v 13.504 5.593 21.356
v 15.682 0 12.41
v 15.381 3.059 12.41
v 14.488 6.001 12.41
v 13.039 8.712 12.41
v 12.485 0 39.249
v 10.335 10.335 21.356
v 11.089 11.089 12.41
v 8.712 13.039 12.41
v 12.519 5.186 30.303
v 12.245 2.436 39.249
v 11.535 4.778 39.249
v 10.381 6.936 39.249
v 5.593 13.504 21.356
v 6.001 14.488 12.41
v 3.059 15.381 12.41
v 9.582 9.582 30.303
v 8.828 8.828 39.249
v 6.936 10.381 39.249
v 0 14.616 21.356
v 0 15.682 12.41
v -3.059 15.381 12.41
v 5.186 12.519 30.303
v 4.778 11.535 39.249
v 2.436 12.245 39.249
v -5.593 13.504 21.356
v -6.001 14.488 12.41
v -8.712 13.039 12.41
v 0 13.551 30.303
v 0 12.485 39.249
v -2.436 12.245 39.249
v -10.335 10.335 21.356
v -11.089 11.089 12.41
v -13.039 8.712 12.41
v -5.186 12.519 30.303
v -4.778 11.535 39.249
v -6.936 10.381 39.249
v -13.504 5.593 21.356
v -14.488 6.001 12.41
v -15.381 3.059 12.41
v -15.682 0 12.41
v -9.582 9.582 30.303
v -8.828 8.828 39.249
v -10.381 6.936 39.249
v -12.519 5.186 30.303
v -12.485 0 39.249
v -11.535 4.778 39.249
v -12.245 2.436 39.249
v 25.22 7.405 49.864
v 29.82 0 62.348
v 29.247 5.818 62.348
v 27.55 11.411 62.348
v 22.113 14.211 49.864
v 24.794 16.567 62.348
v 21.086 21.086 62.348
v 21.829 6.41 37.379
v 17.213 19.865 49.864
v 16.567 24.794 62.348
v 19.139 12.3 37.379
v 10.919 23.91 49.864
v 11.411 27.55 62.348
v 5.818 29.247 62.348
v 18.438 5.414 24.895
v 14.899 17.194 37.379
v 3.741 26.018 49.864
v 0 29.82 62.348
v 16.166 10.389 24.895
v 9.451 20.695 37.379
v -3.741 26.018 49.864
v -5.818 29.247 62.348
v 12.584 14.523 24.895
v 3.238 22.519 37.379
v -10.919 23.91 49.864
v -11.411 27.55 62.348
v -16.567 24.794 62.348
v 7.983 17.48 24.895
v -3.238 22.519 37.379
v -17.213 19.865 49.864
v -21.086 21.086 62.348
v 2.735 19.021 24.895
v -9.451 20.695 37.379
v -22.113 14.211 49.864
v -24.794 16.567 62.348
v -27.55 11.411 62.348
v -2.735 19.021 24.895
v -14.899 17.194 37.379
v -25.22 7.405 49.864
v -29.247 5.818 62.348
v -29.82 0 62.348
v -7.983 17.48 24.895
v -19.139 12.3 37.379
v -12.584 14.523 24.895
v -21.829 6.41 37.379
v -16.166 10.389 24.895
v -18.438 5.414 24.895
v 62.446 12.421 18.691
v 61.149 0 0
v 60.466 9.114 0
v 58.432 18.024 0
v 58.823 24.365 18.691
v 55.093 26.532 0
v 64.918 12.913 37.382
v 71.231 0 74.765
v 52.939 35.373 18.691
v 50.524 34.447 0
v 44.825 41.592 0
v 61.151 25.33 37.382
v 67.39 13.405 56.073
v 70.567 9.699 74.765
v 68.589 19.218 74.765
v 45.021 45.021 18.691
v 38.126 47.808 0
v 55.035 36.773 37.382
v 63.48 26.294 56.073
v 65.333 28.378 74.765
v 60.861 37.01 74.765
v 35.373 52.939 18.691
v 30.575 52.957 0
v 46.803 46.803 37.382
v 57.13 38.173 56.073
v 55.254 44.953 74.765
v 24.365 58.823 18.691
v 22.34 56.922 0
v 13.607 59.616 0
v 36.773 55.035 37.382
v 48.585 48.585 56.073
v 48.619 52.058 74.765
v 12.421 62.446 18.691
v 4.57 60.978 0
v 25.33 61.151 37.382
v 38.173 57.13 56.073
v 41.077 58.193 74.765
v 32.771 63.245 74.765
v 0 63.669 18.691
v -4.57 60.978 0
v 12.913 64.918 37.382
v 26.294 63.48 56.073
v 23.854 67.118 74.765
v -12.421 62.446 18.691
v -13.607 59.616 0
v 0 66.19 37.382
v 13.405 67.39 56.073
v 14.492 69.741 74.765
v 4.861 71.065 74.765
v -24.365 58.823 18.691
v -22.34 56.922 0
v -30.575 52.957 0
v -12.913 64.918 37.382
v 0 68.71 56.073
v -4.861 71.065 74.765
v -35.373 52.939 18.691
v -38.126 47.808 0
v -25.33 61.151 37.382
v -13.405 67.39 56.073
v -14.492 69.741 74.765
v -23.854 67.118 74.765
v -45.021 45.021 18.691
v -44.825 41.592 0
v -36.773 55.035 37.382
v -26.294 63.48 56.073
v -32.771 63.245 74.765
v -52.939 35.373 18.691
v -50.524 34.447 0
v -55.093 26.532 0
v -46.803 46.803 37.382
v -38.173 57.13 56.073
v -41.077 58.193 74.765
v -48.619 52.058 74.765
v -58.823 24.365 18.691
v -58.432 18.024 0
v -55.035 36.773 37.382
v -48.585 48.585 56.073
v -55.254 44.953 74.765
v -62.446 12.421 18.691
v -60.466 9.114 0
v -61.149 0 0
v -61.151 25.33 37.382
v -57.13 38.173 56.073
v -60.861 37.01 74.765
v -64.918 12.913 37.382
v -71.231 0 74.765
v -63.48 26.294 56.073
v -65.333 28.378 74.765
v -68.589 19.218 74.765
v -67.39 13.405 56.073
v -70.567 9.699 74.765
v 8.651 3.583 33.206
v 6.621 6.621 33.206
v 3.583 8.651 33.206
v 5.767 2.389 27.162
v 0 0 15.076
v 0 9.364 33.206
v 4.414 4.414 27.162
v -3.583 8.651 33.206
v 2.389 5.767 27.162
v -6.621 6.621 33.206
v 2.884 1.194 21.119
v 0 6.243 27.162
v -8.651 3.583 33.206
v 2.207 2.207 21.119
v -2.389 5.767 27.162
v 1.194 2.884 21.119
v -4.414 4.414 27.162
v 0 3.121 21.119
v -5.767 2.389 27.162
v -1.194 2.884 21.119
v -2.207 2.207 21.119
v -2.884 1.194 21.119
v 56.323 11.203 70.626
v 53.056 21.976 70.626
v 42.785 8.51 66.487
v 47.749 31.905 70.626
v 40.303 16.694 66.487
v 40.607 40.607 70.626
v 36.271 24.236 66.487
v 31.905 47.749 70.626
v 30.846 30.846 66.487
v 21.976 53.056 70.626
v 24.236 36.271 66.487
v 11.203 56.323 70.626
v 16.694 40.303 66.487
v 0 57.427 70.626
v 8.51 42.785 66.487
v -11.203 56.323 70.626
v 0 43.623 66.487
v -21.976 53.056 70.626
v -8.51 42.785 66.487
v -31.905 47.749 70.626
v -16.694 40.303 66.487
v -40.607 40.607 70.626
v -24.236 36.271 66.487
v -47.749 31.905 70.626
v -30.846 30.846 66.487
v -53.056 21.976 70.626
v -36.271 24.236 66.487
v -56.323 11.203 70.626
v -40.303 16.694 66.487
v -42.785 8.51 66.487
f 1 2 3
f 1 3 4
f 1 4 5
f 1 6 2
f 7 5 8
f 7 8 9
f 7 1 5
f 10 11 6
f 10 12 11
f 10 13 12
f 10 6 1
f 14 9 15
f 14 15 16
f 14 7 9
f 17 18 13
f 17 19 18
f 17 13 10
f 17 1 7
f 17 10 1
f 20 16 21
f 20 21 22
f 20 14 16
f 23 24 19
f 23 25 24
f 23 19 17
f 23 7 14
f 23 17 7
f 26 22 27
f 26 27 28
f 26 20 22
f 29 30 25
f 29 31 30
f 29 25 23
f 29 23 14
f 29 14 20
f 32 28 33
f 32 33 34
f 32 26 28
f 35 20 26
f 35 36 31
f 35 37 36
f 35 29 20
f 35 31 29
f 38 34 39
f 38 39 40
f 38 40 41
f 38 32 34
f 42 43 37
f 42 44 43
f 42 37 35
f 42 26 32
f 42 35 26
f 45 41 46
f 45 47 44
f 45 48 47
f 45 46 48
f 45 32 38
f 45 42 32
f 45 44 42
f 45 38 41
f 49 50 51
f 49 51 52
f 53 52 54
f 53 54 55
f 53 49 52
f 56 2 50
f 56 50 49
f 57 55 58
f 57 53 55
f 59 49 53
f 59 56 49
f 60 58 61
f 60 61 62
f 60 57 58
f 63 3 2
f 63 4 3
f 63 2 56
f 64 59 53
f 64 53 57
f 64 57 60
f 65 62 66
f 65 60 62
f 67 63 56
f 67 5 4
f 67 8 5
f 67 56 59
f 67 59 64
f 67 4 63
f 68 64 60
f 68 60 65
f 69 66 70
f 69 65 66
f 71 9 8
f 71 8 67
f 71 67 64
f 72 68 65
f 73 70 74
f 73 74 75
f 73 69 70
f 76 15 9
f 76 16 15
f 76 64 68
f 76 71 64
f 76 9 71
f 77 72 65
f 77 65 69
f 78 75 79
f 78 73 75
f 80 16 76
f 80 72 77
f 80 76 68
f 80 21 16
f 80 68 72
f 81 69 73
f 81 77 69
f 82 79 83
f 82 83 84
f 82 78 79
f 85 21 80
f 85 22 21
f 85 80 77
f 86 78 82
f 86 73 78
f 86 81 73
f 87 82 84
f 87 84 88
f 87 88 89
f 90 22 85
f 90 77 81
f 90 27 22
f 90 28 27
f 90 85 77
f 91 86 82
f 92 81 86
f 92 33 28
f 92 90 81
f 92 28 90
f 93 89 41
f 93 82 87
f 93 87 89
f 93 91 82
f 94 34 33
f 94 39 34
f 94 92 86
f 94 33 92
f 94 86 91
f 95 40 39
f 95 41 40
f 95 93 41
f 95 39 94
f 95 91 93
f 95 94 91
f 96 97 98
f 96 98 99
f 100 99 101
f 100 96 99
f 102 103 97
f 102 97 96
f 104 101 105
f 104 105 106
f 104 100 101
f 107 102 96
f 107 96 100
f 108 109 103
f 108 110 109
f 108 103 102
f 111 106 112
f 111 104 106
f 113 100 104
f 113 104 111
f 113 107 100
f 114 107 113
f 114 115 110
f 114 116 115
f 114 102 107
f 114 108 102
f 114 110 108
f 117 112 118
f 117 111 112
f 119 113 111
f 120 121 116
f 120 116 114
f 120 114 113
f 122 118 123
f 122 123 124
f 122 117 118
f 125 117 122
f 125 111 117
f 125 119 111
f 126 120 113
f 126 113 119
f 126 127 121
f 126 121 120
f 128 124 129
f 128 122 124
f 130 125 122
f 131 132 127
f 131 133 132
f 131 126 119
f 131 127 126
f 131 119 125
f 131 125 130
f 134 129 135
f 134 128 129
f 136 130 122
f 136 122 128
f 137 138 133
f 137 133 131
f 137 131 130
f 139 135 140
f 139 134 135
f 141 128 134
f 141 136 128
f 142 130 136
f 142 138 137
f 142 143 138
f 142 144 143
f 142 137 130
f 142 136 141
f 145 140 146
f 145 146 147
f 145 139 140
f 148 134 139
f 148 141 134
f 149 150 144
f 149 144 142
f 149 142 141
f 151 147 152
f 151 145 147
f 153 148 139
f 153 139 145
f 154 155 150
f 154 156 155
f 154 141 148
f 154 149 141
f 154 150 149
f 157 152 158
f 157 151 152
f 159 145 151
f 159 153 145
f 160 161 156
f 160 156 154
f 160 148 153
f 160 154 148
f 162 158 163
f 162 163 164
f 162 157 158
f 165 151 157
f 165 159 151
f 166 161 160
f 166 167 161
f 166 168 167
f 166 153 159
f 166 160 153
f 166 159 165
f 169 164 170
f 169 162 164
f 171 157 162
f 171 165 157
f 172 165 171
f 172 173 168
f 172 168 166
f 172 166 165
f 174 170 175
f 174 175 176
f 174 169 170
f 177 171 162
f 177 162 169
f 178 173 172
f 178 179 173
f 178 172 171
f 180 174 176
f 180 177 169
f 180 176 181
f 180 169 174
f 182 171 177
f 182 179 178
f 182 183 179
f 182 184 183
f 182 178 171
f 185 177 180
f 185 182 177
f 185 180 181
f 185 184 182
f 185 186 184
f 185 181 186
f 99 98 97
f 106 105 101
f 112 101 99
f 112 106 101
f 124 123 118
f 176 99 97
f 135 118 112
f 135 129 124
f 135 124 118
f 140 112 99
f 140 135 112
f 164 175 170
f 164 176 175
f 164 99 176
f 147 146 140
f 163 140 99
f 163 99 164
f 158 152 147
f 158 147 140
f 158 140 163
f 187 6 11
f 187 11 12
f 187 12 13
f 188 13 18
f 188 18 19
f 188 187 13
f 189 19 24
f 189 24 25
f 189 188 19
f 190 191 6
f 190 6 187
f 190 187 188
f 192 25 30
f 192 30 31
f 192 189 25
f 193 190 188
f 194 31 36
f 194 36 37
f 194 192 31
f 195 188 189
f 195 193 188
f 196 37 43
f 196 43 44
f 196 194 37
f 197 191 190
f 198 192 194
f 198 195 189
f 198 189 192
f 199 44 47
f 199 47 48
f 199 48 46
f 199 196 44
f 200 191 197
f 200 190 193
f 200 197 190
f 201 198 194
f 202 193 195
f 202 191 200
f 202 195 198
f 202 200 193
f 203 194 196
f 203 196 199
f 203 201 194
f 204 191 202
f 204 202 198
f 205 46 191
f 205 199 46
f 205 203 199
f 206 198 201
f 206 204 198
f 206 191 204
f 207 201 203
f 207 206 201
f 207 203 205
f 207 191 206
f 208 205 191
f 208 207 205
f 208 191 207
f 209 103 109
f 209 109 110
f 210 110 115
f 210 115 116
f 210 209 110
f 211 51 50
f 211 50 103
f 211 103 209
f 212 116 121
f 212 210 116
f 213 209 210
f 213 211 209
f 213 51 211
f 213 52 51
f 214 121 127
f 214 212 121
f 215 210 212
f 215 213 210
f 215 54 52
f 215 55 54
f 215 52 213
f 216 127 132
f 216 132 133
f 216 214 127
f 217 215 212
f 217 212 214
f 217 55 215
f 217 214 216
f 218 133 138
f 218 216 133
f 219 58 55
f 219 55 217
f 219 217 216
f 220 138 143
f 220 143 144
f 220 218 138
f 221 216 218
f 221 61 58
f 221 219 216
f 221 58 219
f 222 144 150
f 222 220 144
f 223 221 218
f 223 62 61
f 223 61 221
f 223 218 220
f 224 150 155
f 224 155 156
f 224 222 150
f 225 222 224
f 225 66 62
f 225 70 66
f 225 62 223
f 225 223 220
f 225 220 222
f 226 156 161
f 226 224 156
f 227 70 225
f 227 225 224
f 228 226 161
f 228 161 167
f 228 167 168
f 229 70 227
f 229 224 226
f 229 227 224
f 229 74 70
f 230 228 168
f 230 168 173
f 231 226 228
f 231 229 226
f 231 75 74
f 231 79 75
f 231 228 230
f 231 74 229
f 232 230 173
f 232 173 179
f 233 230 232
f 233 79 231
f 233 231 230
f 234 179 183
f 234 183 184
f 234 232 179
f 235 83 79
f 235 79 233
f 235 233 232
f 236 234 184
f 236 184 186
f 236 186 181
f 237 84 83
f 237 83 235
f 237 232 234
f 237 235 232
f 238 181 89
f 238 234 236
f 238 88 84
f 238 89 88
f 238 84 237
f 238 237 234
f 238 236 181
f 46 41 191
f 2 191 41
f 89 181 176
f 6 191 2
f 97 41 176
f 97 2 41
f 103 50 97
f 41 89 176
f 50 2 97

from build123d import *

# Parameters (mm, degrees)
F1_ANGLE = 180


# Not quite as in the source:
# - the program builds the solid bodies; features that only make, move or delete a surface that nothing else refers to are left out


with BuildPart() as f1:
    # F0 (on Front) → F1 (revolve)
    with BuildSketch(Plane.XZ):
        Polygon((12.4851092696, 39.2489619553), (0, 15.0755345821), (0, 0), (61.1490756273, 0), (71.2305568159, 74.7646316886), (29.8195946962, 62.3483546078), (15.6820116428, 12.4102499136), align=None)
    revolve(axis=Axis((0, 0, 7.5377672911), (0, 0, 1)), revolution_arc=F1_ANGLE)


solid = f1.part
